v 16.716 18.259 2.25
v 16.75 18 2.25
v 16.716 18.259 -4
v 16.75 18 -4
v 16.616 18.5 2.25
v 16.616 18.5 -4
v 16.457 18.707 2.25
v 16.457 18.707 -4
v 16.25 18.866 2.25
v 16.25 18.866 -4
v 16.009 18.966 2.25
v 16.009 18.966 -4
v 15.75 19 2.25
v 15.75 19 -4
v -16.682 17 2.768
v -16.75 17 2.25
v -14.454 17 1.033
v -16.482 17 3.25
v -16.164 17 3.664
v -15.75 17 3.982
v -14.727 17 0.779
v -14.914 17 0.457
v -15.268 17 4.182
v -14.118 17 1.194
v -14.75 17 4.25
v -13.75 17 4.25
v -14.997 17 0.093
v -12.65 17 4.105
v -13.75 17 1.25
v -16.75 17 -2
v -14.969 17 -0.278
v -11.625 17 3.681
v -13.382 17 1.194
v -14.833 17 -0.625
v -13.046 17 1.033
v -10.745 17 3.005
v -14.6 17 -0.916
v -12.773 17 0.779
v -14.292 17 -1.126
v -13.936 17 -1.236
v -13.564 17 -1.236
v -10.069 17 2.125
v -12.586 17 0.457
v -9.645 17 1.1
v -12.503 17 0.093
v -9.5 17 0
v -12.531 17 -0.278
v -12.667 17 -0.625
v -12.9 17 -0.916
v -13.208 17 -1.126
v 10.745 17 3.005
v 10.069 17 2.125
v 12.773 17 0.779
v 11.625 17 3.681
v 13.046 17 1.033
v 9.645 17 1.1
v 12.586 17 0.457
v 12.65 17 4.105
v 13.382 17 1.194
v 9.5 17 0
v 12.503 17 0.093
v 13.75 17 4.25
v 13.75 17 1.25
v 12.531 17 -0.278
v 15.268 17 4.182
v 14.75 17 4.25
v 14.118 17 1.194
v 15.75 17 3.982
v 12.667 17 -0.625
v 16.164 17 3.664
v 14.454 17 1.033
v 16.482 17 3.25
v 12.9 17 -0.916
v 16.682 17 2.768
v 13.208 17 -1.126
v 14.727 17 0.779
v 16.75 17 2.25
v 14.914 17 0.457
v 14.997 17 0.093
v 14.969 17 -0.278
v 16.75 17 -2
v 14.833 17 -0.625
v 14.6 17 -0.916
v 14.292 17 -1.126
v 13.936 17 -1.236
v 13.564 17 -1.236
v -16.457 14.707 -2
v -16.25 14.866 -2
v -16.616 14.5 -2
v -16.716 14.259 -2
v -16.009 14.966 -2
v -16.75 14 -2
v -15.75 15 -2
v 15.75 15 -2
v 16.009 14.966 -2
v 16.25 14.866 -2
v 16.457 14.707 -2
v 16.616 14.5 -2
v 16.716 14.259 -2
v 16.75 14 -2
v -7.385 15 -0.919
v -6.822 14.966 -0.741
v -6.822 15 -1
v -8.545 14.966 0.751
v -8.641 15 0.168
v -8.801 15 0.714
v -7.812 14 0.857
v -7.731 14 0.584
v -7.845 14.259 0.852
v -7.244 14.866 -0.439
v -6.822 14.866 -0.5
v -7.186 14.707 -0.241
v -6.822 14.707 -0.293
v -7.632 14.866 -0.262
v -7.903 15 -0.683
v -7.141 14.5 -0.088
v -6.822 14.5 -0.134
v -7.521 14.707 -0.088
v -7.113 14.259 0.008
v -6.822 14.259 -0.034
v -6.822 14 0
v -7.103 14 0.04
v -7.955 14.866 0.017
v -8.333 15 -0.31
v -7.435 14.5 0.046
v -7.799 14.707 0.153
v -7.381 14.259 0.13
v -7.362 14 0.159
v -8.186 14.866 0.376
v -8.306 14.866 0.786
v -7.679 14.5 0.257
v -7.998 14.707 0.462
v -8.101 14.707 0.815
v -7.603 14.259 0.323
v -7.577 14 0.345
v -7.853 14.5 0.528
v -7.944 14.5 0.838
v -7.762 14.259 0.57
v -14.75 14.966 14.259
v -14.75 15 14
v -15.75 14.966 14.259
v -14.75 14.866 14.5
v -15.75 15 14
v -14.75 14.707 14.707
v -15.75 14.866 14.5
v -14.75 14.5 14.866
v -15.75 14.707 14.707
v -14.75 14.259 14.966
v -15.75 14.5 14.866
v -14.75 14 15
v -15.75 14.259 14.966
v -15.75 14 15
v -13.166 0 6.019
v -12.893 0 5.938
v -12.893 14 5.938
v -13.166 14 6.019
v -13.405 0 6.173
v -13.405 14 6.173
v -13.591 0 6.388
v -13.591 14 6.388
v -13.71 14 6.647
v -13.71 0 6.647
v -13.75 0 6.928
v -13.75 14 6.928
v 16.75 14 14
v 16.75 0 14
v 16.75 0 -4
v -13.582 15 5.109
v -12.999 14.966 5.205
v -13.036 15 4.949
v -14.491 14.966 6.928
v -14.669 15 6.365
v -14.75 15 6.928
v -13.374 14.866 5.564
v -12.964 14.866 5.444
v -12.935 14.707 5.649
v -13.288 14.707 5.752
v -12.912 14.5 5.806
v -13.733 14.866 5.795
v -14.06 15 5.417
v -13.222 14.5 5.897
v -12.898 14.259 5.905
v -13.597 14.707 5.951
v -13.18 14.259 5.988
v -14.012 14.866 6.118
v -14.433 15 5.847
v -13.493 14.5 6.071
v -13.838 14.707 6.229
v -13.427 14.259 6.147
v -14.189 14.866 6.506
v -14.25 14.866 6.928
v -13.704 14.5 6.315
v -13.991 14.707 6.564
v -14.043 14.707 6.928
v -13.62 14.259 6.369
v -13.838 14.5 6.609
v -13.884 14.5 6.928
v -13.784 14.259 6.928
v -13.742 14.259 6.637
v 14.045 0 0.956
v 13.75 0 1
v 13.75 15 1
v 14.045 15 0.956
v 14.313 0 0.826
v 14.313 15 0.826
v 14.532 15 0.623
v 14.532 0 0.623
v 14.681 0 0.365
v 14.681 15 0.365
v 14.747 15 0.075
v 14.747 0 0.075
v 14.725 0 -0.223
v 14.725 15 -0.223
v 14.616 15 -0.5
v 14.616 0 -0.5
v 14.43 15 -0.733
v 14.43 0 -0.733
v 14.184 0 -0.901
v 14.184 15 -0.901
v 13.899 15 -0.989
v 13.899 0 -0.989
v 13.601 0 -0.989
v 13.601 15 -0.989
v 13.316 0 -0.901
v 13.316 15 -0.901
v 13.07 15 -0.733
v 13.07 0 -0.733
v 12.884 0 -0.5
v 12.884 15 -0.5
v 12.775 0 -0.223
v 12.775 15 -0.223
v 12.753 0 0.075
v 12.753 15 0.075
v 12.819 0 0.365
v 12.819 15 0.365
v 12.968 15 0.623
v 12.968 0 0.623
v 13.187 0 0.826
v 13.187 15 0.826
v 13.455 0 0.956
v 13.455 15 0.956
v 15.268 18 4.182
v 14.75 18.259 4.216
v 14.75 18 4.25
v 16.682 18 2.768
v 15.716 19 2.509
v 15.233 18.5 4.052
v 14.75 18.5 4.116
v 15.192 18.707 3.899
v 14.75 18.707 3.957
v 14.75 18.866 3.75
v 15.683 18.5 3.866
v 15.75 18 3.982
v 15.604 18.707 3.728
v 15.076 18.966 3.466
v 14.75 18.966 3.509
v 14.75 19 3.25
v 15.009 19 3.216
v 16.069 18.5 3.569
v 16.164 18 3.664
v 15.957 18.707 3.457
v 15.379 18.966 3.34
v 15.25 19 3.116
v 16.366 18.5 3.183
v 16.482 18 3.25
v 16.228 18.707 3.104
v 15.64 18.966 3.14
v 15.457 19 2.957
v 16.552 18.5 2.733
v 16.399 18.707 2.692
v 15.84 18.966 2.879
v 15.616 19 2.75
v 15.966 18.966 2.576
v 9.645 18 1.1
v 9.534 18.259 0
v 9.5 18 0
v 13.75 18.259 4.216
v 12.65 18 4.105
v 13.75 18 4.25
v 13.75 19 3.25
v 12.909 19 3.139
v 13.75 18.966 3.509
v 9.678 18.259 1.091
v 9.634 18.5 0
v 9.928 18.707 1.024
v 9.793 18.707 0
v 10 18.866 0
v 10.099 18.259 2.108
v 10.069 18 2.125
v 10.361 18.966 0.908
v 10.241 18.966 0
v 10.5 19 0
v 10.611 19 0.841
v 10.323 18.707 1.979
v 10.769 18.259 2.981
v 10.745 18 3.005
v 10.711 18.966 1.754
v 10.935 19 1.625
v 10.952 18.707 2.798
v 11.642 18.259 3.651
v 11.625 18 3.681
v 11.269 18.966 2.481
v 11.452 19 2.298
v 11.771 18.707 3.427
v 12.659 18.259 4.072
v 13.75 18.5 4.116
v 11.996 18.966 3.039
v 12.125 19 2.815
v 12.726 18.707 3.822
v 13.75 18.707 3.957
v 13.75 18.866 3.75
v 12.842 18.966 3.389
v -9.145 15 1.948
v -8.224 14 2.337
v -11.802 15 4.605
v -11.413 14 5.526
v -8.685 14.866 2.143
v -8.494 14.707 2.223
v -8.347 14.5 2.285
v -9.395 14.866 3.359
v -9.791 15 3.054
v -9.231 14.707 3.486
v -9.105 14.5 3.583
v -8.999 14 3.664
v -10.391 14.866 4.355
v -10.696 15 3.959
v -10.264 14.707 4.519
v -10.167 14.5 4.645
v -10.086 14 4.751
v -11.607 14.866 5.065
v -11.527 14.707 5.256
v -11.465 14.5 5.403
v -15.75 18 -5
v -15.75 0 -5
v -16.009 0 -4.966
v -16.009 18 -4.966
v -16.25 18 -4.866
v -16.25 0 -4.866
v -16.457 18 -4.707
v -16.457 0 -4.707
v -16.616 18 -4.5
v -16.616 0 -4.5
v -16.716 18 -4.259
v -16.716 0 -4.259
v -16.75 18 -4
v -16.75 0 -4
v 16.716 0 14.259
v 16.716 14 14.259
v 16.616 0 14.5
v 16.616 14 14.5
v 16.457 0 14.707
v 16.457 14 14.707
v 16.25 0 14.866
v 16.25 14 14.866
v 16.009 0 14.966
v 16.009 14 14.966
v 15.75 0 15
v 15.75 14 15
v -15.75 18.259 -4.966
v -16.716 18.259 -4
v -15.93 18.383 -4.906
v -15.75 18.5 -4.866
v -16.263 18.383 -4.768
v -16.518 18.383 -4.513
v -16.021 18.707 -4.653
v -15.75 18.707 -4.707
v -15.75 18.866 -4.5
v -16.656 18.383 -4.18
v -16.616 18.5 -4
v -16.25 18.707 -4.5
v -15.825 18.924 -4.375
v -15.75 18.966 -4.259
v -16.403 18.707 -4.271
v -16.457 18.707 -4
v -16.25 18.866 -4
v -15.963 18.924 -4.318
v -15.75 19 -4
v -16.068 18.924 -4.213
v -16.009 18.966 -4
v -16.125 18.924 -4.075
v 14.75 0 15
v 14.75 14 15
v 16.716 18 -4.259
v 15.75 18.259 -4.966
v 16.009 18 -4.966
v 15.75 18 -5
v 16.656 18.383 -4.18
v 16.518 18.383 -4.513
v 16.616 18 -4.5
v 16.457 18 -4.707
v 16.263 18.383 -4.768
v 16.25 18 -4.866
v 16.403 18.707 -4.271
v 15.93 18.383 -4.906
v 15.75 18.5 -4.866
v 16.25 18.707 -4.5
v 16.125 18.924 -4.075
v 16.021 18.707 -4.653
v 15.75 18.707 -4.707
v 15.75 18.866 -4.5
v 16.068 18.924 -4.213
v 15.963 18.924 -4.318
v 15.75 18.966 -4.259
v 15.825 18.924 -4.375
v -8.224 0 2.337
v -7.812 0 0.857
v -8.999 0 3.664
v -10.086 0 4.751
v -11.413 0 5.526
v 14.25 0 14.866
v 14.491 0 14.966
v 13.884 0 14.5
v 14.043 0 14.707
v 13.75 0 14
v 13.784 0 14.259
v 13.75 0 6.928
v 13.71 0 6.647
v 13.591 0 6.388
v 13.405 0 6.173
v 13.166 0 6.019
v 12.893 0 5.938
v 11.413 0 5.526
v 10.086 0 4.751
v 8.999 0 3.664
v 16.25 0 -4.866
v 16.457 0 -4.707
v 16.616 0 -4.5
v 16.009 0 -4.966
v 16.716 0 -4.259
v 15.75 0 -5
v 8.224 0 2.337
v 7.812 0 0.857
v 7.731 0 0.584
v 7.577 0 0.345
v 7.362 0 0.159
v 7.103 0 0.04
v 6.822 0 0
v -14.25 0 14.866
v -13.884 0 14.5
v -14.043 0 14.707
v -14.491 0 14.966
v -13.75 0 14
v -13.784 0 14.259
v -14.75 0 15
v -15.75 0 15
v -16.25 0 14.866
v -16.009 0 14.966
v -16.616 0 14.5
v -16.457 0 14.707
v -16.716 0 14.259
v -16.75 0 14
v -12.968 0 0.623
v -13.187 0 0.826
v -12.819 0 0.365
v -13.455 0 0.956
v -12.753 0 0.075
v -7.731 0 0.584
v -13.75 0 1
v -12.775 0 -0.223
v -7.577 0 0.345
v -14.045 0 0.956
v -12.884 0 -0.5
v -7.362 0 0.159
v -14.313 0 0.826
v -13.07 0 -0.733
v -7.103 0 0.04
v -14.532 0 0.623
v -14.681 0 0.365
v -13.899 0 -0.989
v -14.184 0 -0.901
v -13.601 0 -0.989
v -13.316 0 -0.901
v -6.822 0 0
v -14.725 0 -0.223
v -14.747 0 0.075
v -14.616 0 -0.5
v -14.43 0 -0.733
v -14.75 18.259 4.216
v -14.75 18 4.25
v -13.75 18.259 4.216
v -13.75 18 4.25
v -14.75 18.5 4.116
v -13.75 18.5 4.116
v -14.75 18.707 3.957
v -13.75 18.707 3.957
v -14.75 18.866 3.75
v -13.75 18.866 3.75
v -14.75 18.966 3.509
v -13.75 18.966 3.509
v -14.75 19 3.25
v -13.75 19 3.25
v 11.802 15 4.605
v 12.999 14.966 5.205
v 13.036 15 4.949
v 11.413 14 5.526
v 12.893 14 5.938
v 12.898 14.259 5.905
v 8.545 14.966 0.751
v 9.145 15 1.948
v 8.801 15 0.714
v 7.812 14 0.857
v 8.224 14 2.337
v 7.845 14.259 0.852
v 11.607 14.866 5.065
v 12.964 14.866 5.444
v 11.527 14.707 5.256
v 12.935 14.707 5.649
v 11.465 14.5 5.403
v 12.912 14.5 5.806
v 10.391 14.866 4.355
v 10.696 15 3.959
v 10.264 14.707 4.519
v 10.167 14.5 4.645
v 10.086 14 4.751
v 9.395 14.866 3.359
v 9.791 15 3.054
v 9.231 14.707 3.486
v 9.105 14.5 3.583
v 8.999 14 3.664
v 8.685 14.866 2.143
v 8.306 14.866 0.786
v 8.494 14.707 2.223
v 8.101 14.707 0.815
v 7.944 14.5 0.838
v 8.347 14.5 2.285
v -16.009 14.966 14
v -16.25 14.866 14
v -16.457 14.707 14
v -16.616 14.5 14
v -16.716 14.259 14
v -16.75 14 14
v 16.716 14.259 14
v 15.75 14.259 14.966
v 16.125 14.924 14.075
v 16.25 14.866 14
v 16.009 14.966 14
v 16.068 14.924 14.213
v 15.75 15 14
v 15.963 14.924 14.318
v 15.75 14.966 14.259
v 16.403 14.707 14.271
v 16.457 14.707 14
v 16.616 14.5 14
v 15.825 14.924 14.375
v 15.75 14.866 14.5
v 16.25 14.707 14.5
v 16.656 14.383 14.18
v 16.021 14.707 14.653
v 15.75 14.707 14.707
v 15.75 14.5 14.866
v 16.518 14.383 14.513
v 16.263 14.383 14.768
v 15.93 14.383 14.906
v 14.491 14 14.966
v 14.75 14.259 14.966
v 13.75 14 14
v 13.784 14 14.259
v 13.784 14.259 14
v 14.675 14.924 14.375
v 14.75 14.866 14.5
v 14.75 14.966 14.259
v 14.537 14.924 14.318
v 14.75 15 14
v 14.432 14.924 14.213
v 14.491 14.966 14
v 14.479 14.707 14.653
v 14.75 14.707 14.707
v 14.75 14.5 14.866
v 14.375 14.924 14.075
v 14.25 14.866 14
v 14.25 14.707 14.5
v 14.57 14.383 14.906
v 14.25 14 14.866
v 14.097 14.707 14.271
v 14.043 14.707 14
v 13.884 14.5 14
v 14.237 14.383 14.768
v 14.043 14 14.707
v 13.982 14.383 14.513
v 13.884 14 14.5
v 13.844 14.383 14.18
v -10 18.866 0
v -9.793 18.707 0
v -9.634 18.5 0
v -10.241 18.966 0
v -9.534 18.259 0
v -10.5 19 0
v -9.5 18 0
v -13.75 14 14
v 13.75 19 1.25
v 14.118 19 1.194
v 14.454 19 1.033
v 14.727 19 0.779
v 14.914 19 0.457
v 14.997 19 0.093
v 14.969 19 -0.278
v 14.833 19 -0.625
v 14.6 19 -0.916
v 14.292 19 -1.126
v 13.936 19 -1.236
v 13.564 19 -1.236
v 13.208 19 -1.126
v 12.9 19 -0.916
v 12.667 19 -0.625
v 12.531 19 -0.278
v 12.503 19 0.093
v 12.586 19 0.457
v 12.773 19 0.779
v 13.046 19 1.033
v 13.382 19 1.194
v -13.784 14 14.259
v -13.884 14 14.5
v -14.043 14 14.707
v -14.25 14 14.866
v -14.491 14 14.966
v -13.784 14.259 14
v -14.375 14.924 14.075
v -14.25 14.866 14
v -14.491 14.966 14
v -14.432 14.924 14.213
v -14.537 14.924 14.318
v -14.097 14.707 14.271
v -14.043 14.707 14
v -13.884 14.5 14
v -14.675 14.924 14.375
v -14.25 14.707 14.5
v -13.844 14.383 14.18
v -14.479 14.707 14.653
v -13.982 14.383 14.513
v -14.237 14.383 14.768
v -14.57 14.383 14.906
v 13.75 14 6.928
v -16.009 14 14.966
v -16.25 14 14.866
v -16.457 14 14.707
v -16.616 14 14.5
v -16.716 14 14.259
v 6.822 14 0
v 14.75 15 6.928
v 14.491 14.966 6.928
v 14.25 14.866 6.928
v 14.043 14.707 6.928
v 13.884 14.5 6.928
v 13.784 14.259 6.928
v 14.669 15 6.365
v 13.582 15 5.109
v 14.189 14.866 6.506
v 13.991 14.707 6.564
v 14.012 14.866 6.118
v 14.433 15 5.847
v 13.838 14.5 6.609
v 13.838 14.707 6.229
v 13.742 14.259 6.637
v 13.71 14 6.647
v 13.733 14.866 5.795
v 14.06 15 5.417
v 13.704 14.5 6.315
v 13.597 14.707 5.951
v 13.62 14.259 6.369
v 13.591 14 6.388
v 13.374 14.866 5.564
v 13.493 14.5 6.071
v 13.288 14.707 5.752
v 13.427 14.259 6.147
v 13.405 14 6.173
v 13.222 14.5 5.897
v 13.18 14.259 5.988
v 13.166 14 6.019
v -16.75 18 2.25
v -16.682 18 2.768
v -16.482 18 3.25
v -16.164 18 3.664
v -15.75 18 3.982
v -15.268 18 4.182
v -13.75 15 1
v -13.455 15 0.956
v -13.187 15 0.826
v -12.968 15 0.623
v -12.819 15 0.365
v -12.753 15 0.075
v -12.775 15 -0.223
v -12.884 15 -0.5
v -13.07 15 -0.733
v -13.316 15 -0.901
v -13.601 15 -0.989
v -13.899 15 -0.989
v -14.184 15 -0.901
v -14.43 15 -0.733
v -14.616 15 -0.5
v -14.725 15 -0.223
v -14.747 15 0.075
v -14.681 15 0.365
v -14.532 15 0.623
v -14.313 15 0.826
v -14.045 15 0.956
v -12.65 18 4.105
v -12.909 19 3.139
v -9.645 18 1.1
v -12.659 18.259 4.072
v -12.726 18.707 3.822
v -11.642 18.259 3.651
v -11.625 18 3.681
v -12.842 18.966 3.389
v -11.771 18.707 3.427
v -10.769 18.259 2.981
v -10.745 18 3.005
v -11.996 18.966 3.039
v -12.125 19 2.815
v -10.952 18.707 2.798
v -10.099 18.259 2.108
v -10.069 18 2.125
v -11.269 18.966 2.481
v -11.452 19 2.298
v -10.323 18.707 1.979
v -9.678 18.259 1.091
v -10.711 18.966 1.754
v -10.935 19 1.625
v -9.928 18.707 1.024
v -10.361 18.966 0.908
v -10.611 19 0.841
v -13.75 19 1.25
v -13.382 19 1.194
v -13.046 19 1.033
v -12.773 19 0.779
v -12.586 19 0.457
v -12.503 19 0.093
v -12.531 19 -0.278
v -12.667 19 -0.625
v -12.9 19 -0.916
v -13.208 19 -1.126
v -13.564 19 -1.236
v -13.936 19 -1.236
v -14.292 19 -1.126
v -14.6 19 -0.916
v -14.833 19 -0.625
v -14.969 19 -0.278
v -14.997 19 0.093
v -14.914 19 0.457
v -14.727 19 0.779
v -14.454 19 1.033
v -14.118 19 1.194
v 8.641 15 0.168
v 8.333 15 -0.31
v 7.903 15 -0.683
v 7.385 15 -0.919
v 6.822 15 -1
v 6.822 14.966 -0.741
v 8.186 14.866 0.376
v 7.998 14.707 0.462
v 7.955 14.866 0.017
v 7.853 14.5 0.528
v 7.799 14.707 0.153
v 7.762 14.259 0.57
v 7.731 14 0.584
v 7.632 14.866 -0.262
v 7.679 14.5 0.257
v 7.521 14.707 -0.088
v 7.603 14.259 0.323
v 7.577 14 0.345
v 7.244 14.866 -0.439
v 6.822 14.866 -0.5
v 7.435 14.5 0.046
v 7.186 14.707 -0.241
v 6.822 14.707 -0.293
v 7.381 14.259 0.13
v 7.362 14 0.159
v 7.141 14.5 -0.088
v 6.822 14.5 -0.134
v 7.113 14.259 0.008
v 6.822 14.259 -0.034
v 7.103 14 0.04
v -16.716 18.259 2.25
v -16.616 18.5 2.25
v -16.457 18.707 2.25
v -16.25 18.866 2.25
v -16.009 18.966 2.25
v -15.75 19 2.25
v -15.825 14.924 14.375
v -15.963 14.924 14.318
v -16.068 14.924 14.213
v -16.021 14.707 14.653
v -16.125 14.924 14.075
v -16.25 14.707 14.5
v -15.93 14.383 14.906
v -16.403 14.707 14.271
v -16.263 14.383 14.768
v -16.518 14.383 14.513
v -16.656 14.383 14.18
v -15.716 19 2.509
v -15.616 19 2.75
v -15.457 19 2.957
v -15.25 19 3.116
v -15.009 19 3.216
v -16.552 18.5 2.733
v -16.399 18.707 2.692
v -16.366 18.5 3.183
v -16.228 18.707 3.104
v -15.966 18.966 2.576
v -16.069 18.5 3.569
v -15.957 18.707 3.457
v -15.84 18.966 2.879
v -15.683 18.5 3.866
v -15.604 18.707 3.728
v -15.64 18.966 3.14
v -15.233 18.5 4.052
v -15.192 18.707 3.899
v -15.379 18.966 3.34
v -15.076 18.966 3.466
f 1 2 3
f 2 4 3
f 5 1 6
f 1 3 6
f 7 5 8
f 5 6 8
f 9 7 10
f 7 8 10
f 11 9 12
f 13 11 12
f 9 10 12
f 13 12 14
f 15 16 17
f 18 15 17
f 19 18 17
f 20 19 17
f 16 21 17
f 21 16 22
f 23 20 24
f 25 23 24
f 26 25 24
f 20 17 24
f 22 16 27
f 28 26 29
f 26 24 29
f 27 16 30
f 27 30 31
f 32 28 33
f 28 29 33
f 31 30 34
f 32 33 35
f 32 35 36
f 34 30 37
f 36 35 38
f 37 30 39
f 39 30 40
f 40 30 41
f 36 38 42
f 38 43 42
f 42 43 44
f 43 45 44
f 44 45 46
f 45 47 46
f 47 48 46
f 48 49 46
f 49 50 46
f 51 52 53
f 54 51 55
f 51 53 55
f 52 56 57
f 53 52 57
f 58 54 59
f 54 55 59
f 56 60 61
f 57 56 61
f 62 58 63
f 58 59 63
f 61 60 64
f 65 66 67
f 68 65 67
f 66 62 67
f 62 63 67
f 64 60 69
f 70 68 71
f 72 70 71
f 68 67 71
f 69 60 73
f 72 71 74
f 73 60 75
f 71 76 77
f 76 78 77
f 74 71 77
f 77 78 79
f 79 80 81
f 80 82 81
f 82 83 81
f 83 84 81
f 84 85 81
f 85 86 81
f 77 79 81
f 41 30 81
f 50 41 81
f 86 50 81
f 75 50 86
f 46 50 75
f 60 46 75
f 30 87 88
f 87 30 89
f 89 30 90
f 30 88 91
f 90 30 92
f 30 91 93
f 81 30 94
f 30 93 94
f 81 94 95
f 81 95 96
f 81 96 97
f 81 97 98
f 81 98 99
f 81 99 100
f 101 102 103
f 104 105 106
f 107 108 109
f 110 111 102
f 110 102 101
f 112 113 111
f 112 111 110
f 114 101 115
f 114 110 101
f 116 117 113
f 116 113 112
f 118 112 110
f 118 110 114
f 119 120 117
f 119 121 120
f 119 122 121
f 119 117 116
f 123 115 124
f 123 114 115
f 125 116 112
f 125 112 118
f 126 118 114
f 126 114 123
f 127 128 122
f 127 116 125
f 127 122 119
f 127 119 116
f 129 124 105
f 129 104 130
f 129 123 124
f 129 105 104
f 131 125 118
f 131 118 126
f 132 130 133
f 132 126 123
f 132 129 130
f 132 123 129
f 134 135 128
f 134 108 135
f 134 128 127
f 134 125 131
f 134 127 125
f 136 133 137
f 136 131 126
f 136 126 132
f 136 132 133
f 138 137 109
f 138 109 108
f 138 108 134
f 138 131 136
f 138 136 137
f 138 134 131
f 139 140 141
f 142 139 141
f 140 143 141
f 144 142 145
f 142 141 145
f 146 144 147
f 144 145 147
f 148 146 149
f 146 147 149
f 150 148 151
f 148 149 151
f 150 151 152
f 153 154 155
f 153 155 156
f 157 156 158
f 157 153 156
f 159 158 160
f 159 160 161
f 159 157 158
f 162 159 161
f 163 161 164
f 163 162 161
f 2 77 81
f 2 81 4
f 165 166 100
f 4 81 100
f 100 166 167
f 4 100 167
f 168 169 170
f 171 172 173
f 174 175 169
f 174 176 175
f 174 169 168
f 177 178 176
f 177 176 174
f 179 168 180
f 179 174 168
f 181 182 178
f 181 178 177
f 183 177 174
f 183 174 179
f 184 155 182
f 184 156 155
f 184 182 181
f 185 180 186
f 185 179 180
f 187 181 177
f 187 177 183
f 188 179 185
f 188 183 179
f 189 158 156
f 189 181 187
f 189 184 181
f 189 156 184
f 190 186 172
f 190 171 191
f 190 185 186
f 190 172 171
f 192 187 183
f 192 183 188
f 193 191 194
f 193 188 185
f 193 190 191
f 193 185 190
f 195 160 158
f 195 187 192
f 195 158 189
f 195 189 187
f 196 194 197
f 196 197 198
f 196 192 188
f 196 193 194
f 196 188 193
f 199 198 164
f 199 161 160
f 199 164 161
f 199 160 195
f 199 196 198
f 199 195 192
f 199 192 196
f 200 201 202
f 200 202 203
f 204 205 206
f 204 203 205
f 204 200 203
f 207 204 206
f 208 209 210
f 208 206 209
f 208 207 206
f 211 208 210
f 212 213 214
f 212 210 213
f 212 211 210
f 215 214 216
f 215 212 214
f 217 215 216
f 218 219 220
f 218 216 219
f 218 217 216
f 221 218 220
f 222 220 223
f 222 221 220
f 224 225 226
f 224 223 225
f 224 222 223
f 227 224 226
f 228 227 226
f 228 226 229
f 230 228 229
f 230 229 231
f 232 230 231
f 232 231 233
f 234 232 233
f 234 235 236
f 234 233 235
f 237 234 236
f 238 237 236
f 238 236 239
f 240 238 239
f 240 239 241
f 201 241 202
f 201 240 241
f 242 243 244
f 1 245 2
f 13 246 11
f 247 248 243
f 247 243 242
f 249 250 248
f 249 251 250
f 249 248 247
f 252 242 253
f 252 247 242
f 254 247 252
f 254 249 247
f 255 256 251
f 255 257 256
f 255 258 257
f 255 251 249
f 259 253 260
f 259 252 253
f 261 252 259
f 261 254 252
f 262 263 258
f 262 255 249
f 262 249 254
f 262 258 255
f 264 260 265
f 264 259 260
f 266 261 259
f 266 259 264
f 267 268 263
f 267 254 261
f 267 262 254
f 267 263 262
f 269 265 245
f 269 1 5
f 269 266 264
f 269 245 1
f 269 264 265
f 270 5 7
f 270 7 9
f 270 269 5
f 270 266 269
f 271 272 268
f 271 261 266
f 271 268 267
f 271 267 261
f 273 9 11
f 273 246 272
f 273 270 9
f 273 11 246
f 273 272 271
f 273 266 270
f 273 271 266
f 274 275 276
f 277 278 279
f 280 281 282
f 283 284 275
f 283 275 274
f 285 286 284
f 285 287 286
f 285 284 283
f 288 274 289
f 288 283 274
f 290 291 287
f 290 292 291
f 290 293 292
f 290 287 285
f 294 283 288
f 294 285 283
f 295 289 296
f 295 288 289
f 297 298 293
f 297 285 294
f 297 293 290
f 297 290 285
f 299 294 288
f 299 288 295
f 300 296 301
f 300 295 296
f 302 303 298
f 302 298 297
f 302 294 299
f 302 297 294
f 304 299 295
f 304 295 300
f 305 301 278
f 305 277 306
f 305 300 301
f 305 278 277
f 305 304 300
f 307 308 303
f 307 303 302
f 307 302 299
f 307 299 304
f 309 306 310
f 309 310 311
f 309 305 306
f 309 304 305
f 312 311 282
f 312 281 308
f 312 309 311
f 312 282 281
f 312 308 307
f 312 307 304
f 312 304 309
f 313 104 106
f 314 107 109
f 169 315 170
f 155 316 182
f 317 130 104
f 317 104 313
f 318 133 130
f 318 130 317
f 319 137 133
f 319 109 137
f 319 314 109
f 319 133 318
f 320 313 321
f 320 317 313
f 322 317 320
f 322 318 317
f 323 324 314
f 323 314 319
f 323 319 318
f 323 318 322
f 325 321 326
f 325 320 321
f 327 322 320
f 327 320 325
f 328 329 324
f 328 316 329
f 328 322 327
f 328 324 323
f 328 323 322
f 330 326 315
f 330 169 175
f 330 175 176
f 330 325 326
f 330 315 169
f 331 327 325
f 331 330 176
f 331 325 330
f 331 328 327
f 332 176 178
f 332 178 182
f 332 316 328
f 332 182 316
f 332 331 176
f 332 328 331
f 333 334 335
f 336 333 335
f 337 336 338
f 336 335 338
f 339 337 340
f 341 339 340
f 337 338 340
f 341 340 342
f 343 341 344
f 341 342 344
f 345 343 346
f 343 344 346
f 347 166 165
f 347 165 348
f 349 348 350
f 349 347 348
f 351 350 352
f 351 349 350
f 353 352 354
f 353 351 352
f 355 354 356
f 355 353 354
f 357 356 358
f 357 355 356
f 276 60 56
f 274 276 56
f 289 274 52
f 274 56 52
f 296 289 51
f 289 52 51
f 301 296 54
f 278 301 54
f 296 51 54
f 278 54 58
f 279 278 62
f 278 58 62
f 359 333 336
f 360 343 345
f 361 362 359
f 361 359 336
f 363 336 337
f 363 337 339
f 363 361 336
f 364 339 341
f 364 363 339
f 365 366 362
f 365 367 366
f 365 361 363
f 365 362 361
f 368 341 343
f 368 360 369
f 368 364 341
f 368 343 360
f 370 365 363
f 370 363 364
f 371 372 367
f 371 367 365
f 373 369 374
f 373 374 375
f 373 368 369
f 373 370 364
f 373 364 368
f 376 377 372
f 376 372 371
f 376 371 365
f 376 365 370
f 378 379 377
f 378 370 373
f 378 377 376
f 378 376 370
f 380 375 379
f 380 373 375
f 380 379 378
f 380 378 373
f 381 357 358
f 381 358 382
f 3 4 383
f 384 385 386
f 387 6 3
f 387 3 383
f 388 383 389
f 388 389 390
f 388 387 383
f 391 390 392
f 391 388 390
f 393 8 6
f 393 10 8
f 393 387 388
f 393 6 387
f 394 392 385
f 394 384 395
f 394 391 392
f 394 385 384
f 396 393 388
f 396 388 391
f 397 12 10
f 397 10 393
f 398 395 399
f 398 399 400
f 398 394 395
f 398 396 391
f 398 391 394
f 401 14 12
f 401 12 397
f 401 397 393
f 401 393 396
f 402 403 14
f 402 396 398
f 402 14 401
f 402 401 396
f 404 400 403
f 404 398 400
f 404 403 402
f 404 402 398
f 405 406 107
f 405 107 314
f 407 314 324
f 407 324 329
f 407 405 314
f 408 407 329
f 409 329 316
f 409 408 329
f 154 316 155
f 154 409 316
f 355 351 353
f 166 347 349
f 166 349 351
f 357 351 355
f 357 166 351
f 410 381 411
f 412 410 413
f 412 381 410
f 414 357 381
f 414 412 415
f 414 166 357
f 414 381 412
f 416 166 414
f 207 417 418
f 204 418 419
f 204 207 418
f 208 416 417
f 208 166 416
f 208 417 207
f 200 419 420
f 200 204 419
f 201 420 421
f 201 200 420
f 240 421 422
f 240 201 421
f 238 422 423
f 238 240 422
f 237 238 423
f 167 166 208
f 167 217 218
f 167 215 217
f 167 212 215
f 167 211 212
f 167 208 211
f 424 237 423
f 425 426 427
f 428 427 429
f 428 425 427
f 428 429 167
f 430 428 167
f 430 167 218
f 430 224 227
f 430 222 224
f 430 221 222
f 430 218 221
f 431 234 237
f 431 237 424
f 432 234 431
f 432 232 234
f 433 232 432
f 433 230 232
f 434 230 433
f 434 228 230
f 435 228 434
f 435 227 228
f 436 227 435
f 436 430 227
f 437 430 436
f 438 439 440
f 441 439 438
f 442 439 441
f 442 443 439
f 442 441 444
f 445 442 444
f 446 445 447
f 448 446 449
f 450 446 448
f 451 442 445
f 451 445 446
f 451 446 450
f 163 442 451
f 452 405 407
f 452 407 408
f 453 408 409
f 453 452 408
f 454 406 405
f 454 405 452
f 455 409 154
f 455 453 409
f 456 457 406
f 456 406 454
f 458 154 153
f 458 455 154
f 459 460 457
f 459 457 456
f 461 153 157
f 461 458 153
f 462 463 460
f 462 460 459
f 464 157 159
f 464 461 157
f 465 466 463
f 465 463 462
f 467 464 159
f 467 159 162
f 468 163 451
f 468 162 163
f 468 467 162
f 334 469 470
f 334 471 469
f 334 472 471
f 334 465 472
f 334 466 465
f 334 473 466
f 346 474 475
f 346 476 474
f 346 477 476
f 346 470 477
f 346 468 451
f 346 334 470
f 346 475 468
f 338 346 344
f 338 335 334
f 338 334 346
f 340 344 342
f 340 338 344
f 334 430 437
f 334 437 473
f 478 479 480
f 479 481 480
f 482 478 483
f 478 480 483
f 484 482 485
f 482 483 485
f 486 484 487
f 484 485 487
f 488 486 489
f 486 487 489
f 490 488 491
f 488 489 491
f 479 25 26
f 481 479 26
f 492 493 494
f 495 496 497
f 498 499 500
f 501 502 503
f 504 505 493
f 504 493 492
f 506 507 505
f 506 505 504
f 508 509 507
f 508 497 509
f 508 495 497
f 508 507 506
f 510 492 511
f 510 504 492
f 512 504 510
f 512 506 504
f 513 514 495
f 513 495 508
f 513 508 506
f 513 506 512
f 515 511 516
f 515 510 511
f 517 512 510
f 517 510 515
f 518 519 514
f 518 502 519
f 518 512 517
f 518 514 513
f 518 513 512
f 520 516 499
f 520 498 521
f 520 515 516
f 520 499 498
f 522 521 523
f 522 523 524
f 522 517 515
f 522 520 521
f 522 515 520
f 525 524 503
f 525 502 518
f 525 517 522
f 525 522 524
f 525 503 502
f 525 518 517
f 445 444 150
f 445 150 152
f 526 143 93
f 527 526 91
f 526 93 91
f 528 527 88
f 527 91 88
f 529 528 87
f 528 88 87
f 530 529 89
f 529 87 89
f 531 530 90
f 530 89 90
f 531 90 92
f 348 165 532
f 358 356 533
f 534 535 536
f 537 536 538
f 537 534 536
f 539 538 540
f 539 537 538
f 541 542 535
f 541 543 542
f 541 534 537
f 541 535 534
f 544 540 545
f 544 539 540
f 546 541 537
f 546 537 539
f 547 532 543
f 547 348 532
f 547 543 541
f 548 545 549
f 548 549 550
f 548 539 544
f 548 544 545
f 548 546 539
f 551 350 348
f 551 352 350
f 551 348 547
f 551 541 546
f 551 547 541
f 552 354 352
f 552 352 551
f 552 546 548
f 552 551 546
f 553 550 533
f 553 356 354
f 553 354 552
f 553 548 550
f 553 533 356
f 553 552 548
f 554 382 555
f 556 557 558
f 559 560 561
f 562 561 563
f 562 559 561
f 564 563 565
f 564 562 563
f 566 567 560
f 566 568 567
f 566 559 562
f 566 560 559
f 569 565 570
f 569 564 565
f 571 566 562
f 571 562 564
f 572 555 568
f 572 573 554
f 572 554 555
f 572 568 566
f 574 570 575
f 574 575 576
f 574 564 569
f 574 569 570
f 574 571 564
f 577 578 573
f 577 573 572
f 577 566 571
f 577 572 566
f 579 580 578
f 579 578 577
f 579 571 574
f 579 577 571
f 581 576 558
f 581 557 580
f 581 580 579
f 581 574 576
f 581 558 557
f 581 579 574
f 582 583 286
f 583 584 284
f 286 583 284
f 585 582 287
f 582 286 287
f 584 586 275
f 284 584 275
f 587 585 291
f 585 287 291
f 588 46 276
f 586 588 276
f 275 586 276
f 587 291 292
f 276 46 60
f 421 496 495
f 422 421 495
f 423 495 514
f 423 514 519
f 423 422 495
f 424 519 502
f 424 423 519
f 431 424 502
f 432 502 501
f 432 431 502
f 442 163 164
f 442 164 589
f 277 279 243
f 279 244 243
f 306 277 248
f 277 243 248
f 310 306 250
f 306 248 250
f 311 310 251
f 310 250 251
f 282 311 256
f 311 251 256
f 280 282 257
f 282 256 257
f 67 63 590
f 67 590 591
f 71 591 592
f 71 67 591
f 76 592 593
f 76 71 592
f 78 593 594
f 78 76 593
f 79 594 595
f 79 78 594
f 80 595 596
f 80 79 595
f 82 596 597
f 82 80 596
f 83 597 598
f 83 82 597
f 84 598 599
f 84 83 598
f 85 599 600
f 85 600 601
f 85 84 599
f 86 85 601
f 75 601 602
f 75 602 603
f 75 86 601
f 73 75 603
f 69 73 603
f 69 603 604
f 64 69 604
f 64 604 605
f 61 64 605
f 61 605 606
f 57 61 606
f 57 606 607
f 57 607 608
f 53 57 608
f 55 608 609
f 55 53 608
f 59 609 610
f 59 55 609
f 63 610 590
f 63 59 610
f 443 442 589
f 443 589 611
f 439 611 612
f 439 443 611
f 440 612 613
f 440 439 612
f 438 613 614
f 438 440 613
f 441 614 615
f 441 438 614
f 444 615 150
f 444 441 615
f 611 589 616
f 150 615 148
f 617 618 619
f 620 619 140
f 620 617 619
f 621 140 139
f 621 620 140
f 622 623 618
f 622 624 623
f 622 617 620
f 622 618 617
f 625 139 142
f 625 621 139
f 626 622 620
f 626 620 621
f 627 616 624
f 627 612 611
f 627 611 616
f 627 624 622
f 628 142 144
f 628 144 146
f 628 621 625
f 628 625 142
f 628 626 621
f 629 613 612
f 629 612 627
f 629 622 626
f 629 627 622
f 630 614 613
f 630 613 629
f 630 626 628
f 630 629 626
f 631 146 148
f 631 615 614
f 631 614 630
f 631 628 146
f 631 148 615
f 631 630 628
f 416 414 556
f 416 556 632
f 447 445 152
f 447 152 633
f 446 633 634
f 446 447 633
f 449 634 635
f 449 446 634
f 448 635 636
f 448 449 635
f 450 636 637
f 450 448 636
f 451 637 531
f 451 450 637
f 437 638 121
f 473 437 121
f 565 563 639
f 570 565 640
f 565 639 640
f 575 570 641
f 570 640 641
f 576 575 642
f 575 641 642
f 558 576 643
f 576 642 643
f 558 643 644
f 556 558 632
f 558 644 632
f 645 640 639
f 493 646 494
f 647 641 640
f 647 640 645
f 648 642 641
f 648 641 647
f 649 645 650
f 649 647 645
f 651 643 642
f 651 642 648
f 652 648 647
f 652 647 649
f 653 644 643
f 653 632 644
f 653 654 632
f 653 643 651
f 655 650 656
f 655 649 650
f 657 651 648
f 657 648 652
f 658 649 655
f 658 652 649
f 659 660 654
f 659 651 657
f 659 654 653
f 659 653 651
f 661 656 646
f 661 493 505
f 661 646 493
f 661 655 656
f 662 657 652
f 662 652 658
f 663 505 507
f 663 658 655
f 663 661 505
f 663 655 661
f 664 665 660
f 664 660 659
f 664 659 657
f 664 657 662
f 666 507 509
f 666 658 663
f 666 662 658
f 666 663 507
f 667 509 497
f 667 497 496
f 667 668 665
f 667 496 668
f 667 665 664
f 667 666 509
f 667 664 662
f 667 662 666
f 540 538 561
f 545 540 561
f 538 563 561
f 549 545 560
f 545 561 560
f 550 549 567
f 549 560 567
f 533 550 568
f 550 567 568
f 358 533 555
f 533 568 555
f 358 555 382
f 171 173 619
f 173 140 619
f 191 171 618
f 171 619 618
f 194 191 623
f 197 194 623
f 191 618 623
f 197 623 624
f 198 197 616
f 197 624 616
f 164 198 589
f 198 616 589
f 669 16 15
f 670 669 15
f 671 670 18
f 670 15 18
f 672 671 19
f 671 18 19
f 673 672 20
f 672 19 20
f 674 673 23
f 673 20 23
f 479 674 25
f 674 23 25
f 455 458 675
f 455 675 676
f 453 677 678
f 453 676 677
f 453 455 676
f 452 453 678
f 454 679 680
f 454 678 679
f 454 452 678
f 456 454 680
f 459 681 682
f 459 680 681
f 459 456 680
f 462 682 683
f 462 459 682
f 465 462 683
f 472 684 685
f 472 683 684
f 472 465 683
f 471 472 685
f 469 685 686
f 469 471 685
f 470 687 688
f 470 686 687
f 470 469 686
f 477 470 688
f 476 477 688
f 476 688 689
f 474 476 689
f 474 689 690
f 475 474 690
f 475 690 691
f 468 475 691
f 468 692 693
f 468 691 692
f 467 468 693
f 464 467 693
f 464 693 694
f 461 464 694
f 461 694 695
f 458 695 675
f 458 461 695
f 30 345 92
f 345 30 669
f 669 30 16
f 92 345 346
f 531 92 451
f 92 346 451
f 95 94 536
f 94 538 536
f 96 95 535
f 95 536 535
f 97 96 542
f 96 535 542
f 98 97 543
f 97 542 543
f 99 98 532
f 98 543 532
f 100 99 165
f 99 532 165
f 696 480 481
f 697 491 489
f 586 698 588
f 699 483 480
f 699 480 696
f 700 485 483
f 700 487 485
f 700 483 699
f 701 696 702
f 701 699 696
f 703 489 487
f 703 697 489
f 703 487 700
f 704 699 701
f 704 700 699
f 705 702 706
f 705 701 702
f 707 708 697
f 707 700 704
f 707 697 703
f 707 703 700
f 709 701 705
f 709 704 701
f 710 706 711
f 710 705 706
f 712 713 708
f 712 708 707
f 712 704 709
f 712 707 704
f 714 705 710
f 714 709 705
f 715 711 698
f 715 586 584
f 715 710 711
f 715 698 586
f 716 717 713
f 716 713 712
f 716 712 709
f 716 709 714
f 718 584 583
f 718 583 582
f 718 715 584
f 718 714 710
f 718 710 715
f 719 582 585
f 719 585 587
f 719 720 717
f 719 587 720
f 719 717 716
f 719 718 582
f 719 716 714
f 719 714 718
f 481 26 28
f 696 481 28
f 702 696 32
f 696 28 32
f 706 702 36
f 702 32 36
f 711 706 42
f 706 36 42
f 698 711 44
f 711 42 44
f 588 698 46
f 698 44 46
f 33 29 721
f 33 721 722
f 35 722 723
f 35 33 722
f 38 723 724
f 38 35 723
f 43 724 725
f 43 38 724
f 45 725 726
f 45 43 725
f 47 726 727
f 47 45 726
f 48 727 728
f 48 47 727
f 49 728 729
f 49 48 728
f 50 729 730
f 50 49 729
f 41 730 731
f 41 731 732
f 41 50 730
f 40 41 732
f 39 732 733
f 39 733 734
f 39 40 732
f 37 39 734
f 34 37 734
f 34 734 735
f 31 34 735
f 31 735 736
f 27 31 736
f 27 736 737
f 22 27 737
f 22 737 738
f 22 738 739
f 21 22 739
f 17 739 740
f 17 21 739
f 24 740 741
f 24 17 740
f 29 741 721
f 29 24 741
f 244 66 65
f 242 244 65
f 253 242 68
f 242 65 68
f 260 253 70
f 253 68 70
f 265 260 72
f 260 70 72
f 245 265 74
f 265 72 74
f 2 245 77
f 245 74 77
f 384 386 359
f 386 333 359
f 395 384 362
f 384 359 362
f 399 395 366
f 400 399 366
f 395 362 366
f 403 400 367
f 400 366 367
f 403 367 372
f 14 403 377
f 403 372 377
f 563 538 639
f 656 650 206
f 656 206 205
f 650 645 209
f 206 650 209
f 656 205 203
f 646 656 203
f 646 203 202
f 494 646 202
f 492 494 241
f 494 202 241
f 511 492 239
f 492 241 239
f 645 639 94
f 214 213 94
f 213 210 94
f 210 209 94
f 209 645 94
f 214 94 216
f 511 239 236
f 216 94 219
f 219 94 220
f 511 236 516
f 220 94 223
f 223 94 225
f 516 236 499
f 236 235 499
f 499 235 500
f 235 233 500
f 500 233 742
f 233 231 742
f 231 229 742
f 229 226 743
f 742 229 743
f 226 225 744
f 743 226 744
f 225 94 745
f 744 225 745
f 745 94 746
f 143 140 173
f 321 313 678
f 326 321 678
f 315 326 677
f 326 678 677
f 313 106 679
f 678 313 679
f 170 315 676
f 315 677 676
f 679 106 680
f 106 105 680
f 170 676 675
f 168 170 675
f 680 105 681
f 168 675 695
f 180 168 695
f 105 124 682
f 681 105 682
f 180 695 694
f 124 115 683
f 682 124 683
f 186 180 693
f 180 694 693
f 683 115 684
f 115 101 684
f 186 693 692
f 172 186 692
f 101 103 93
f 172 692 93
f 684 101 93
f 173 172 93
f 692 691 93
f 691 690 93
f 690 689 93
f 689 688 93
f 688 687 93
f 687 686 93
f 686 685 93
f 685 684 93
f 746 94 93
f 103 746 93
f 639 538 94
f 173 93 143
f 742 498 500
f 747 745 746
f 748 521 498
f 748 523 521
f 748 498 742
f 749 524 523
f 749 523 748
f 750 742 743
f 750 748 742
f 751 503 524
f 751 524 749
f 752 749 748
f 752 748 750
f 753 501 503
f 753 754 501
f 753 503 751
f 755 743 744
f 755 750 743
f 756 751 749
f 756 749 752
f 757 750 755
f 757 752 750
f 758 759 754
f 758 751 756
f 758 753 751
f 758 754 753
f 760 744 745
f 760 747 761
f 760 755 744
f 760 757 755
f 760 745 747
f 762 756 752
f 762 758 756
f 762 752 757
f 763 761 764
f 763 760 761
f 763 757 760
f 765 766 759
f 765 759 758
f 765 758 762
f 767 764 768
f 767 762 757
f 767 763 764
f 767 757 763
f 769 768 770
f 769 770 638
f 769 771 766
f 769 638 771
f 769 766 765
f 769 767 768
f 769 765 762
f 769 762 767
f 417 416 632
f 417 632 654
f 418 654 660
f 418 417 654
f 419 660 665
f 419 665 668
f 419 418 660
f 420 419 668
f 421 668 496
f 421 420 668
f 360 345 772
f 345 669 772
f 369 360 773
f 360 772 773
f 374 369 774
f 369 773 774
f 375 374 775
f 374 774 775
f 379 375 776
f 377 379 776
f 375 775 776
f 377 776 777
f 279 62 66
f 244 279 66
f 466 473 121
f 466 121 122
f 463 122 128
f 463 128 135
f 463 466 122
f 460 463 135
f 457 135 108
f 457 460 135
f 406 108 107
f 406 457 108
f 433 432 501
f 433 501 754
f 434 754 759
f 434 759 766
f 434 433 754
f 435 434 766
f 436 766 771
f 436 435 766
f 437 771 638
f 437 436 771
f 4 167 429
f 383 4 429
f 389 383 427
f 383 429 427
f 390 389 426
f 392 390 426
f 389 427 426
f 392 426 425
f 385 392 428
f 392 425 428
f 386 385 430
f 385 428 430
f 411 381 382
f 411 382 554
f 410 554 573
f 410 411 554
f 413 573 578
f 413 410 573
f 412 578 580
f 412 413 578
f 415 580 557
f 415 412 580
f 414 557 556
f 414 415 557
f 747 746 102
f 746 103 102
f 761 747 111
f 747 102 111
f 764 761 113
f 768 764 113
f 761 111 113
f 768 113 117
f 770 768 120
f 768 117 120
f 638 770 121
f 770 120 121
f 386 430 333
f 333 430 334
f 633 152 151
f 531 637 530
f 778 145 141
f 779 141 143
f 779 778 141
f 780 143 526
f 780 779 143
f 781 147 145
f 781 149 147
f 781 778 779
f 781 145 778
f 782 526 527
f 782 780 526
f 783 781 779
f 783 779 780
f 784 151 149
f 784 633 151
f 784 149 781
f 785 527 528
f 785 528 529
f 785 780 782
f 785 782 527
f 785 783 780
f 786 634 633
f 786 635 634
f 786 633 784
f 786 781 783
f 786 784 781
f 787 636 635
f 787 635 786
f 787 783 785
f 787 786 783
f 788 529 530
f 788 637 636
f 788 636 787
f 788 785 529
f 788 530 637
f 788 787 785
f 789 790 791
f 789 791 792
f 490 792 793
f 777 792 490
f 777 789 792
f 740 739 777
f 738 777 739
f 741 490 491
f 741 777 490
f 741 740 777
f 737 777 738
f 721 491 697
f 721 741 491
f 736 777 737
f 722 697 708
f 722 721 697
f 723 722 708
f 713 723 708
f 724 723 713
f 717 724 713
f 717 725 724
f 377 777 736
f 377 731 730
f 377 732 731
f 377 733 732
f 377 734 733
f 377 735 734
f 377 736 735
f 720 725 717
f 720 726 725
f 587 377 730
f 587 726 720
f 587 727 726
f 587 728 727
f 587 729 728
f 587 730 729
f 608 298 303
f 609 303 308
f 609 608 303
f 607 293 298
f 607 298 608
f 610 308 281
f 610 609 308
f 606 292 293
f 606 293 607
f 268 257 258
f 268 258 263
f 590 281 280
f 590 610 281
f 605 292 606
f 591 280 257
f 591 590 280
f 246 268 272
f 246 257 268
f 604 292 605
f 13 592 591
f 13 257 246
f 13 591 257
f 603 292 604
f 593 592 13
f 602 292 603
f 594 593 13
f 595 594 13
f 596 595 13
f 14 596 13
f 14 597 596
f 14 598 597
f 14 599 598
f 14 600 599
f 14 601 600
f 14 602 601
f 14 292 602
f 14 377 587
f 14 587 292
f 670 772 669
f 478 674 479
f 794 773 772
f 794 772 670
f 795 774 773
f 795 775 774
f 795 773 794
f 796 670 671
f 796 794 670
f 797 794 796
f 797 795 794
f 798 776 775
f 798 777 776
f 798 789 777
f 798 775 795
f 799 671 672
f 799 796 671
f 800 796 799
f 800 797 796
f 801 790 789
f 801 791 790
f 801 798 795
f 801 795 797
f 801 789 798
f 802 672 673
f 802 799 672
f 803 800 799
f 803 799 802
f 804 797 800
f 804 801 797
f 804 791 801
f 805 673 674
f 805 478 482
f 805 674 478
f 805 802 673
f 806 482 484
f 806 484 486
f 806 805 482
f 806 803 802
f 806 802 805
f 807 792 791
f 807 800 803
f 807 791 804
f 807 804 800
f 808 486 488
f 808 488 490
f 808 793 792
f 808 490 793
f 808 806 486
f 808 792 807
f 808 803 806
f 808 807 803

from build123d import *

# Parameters (mm, degrees)
MAIN_BODY_DEPTH                = 15
EXTENSION_FOR_TOP_FLANGE_DEPTH = 2
SKETCH4_R                      = 1.25
TOP_CAMERA_FLANGE_DEPTH        = 2
M2_SCREWHOLE_DEPTH             = 28.028919697
M2_SCREWHOLE_DEPTH_BACK        = 28.028919697
SKETCH5_R                      = 1
FILLET1_R                      = 1


with BuildPart() as part:
    # Sketch2 → Main body (new body)
    with BuildSketch(Plane(origin=(0, 0, 0), x_dir=(1, 0, 0), z_dir=(0, 1, 0))):
        with BuildLine():
            Line((-16.75, -14), (-16.75, 4))
            ThreePointArc((-16.75, 4), (-16.457106781, 4.707106781), (-15.75, 5))
            Line((-15.75, 5), (15.75, 5))
            ThreePointArc((15.75, 5), (16.457106781, 4.707106781), (16.75, 4))
            Line((16.75, 4), (16.75, -14))
            ThreePointArc((16.75, -14), (16.457106781, -14.707106781), (15.75, -15))
            Line((15.75, -15), (14.75, -15))
            ThreePointArc((14.75, -15), (14.042893219, -14.707106781), (13.75, -14))
            Line((13.75, -14), (13.75, -6.92820323))
            ThreePointArc((13.75, -6.92820323), (13.505928946, -6.27354956), (12.892857143, -5.938459912))
            ThreePointArc((12.892857143, -5.938459912), (9.507359313, -4.242640687), (7.811540088, -0.857142857))
            ThreePointArc((7.811540088, -0.857142857), (7.47645044, -0.244071054), (6.82179677, 0))
            Line((6.82179677, 0), (-6.82179677, 0))
            ThreePointArc((-6.82179677, 0), (-7.47645044, -0.244071054), (-7.811540088, -0.857142857))
            ThreePointArc((-7.811540088, -0.857142857), (-9.507359313, -4.242640687), (-12.892857143, -5.938459912))
            ThreePointArc((-12.892857143, -5.938459912), (-13.505928946, -6.27354956), (-13.75, -6.92820323))
            Line((-13.75, -6.92820323), (-13.75, -14))
            ThreePointArc((-13.75, -14), (-14.042893219, -14.707106781), (-14.75, -15))
            Line((-14.75, -15), (-15.75, -15))
            ThreePointArc((-15.75, -15), (-16.457106781, -14.707106781), (-16.75, -14))
        make_face()
    extrude(amount=MAIN_BODY_DEPTH)

    # Sketch3 → Extension for top flange (add)
    with BuildSketch(Plane(origin=(0, 15, 0), x_dir=(1, 0, 0), z_dir=(0, 1, 0))):
        with BuildLine():
            Line((16.75, 2), (16.75, 4))
            ThreePointArc((16.75, 4), (16.457106781, 4.707106781), (15.75, 5))
            Line((15.75, 5), (-15.75, 5))
            ThreePointArc((-15.75, 5), (-16.457106781, 4.707106781), (-16.75, 4))
            Line((-16.75, 4), (-16.75, 2))
            Line((-16.75, 2), (16.75, 2))
        make_face()
    extrude(amount=EXTENSION_FOR_TOP_FLANGE_DEPTH)

    # Sketch4 → Top camera flange (add)
    with BuildSketch(Plane(origin=(0, 17, 0), x_dir=(1, 0, 0), z_dir=(0, 1, 0))):
        with BuildLine():
            Line((16.75, -2.25), (16.75, 2))
            Line((16.75, 2), (16.75, 4))
            ThreePointArc((16.75, 4), (16.457106781, 4.707106781), (15.75, 5))
            Line((15.75, 5), (-15.75, 5))
            ThreePointArc((-15.75, 5), (-16.457106781, 4.707106781), (-16.75, 4))
            Line((-16.75, 4), (-16.75, 2))
            Line((-16.75, 2), (-16.75, -2.25))
            ThreePointArc((-16.75, -2.25), (-16.164213562, -3.664213562), (-14.75, -4.25))
            Line((-14.75, -4.25), (-13.75, -4.25))
            ThreePointArc((-13.75, -4.25), (-10.74479618, -3.00520382), (-9.5, 0))
            Line((-9.5, 0), (9.5, 0))
            ThreePointArc((9.5, 0), (10.74479618, -3.00520382), (13.75, -4.25))
            Line((13.75, -4.25), (14.75, -4.25))
            ThreePointArc((14.75, -4.25), (16.164213562, -3.664213562), (16.75, -2.25))
        make_face()
        with Locations(Location((-13.75, 0, 0), (0, 0, 270))):
            Circle(SKETCH4_R, mode=Mode.SUBTRACT)
        with Locations(Location((13.75, 0, 0), (0, 0, 270))):
            Circle(SKETCH4_R, mode=Mode.SUBTRACT)
    extrude(amount=TOP_CAMERA_FLANGE_DEPTH)

    # Sketch5 → M2 screwhole (cut, two sides: drawn at the far end of the back side and taken through both)
    with BuildSketch(Plane(origin=(0, 15, 0), x_dir=(1, 0, 0), z_dir=(0, 1, 0)).offset(-M2_SCREWHOLE_DEPTH_BACK)):
        with Locations(Location((-13.75, 0, 0), (0, 0, 270))):
            Circle(SKETCH5_R)
        with Locations(Location((13.75, 0, 0), (0, 0, 270))):
            Circle(SKETCH5_R)
    extrude(amount=M2_SCREWHOLE_DEPTH + M2_SCREWHOLE_DEPTH_BACK, mode=Mode.SUBTRACT)

    # Fillet1
    fillet1_edges = [part.edges().sort_by_distance(p)[0] for p in [
        (-13.505928946, 15, 6.27354956),
        (-9.507359313, 15, 4.242640687),
        (-7.47645044, 15, 0.244071054),
        (0, 15, 0),
        (7.47645044, 15, 0.244071054),
        (9.507359313, 15, 4.242640687),
        (13.505928946, 15, 6.27354956),
        (13.75, 15, 10.464101615),
        (14.042893219, 15, 14.707106781),
        (15.25, 15, 15),
        (-14.042893219, 15, 14.707106781),
        (16.457106781, 15, 14.707106781),
        (16.75, 15, 6),
        (-16.75, 15, 6),
        (-16.457106781, 15, 14.707106781),
        (-15.25, 15, 15),
        (16.75, 19, -0.875),
        (16.457106781, 19, -4.707106781),
        (0, 19, -5),
        (-16.457106781, 19, -4.707106781),
        (-16.75, 19, -0.875),
        (-16.164213562, 19, 3.664213562),
        (-14.25, 19, 4.25),
        (-10.74479618, 19, 3.00520382),
        (10.74479618, 19, 3.00520382),
        (14.25, 19, 4.25),
        (16.164213562, 19, 3.664213562),
        (-13.75, 15, 10.464101615),
    ]]
    fillet(fillet1_edges, radius=FILLET1_R)


solid = part.part
